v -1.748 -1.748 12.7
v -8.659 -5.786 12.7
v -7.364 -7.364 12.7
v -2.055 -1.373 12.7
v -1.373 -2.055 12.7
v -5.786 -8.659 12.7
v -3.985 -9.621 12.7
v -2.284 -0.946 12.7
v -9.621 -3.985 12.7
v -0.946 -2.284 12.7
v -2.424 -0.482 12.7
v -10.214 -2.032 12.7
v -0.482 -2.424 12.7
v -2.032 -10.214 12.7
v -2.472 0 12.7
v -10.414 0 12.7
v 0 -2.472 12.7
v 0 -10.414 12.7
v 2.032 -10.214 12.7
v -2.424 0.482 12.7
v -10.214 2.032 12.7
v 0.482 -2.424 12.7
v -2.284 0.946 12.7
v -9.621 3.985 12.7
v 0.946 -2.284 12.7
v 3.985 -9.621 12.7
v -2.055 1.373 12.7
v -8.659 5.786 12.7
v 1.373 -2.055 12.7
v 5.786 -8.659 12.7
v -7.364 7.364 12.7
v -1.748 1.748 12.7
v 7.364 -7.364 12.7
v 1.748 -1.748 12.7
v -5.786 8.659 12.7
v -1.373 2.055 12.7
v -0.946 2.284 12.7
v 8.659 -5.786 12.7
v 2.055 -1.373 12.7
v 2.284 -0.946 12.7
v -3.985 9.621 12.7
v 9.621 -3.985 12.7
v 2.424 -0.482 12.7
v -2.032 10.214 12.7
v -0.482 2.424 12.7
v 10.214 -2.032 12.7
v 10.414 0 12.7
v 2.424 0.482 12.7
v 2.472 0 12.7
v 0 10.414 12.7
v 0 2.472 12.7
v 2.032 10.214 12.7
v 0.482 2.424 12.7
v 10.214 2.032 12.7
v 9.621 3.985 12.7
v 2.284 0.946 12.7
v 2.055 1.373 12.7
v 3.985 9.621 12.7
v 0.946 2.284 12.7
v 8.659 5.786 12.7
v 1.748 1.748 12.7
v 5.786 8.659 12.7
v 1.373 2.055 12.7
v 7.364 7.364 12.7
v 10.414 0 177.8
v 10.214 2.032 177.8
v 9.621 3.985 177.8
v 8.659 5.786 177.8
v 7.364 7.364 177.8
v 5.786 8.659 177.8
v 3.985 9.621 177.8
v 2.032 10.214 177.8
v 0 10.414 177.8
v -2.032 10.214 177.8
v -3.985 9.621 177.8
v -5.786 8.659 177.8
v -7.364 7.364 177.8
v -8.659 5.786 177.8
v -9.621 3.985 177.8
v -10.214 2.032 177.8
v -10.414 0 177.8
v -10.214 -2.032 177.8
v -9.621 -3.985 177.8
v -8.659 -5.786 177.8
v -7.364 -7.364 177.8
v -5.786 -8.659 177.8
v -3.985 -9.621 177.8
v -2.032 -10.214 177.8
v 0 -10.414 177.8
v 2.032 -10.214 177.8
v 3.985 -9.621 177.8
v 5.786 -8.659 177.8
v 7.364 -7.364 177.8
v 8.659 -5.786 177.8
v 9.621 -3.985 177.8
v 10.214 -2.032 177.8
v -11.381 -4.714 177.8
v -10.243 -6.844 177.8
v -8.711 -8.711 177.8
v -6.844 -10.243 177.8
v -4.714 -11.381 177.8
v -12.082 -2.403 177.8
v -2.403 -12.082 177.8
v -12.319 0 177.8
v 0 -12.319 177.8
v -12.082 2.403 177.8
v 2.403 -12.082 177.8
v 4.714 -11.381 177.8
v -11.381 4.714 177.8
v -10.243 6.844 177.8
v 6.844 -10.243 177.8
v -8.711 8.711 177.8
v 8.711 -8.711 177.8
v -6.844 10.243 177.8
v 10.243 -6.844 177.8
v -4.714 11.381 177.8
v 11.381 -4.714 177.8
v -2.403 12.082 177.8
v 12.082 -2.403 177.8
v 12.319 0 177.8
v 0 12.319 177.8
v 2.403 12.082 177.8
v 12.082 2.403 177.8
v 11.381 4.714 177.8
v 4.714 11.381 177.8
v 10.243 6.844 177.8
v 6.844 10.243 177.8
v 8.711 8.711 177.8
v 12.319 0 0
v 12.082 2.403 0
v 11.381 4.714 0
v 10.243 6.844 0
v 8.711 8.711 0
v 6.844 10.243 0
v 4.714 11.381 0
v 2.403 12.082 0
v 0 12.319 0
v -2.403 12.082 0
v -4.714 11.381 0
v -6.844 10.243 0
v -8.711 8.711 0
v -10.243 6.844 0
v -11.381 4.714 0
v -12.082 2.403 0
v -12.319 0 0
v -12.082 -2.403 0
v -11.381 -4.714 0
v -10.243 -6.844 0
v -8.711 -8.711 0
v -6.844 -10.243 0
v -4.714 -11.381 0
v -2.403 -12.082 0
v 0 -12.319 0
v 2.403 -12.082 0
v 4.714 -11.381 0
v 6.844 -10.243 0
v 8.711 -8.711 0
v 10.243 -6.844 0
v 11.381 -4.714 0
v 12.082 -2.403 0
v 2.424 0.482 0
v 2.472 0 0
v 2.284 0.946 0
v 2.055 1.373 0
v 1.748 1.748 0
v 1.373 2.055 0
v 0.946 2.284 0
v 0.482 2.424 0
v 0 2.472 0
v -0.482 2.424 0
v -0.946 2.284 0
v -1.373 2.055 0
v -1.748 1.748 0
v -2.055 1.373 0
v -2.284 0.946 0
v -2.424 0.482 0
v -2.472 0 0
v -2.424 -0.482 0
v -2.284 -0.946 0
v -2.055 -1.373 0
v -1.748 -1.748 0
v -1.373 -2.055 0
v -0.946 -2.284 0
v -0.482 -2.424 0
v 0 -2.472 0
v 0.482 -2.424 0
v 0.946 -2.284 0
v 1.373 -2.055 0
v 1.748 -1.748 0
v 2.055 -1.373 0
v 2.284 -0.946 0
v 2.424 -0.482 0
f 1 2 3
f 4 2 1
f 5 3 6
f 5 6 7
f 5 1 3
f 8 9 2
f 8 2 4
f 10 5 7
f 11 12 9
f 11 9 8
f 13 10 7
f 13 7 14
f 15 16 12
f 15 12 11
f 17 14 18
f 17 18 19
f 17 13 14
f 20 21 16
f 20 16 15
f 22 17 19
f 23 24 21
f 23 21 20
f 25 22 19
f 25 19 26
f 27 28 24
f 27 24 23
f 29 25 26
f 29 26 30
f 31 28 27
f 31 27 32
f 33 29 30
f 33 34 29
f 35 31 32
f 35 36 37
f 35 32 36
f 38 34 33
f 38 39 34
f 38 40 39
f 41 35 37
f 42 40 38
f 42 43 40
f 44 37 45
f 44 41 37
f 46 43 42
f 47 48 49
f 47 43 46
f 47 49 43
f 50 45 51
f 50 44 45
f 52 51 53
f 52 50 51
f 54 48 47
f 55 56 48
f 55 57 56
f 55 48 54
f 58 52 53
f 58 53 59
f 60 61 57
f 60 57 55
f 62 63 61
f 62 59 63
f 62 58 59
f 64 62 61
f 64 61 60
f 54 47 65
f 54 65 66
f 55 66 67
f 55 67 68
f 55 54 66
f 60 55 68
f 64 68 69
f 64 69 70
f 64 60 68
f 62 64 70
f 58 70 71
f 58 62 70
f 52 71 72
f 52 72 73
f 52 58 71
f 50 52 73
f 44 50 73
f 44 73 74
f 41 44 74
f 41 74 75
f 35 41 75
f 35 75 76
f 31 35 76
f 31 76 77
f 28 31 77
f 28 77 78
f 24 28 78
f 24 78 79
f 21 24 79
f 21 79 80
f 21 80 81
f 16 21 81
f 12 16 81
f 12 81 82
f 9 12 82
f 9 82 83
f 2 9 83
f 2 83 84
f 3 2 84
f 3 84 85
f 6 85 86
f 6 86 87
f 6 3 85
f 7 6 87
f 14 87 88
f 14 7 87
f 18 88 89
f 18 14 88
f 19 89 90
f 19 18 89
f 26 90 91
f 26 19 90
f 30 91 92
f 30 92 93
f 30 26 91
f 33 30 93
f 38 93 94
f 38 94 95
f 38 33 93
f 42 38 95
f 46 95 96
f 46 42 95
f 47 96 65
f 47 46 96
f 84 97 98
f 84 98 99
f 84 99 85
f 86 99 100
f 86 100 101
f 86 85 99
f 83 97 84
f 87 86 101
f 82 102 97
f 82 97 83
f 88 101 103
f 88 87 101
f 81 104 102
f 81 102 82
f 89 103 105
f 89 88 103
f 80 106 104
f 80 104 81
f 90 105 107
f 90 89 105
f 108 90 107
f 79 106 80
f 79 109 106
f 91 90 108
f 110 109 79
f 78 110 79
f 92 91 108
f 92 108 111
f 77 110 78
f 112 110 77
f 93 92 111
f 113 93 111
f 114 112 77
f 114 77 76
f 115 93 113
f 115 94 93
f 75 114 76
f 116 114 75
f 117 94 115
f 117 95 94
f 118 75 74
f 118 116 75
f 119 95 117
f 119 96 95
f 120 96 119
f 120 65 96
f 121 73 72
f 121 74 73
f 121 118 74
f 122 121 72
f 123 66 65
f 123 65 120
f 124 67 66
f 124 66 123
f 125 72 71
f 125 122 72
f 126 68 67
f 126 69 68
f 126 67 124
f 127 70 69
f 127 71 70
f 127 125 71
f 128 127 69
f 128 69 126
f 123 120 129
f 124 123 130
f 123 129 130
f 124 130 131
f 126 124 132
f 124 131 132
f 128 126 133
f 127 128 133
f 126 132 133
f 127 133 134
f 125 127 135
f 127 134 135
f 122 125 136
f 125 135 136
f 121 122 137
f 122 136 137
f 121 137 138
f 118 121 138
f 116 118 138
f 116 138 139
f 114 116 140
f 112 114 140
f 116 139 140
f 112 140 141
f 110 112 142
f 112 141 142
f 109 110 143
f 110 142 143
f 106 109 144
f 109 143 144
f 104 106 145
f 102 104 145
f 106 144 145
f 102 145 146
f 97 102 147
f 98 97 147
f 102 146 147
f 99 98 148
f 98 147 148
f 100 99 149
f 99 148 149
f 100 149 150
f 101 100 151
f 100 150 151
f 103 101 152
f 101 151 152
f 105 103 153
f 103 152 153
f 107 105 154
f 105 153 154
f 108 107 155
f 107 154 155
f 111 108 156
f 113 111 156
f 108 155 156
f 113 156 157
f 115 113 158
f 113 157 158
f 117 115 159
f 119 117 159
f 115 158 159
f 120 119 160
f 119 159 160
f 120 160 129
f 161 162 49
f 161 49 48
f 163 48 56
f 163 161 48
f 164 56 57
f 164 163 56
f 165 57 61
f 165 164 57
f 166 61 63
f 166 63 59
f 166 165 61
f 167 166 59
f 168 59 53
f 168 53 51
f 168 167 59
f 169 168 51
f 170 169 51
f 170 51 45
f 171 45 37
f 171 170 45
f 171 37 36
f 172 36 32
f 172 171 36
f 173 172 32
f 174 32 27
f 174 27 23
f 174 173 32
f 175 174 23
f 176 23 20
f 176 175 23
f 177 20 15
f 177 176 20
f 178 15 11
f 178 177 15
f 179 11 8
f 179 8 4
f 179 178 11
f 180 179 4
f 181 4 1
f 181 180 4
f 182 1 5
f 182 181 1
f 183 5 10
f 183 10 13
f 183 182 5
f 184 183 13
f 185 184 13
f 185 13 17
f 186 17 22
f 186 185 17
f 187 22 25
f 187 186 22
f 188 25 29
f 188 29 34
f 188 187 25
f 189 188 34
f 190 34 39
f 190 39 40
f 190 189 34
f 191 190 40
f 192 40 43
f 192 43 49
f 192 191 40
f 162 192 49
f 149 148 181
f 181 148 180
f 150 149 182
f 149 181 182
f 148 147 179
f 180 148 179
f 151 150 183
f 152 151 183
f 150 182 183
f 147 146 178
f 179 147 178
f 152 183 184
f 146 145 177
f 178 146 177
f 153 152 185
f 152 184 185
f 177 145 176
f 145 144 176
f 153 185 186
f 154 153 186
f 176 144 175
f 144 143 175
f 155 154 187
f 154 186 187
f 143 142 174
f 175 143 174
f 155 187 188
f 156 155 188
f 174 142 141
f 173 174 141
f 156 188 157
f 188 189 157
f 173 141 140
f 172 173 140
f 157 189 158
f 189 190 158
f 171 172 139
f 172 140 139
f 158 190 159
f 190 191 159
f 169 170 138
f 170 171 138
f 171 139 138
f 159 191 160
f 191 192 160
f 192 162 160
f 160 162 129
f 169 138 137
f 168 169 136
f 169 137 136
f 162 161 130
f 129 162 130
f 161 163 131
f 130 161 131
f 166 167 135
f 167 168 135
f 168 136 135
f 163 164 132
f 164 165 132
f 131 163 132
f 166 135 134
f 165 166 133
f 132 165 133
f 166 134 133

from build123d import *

# Parameters (mm, degrees)
F0_R     = 12.319
F0_R_2   = 10.414
F1_DEPTH = 177.8
F0_R_3   = 2.471855
F2_DEPTH = 12.7
F3_DEPTH = 25.4


with BuildPart() as f1:
    # F0 (on Top) → F1 (new body)
    with BuildSketch(Plane.XY):
        Circle(F0_R)
        Circle(F0_R_2, mode=Mode.SUBTRACT)
    extrude(amount=F1_DEPTH)

    # F0 (on Top) → F2 (join)
    with BuildSketch(Plane.XY):
        Circle(F0_R_2)
        Circle(F0_R_3, mode=Mode.SUBTRACT)
    extrude(amount=F2_DEPTH)

    # F0 (on Top) → F3 (cut)
    with BuildSketch(Plane.XY):
        Circle(F0_R_3)
    extrude(amount=-F3_DEPTH, mode=Mode.SUBTRACT)


solid = f1.part
